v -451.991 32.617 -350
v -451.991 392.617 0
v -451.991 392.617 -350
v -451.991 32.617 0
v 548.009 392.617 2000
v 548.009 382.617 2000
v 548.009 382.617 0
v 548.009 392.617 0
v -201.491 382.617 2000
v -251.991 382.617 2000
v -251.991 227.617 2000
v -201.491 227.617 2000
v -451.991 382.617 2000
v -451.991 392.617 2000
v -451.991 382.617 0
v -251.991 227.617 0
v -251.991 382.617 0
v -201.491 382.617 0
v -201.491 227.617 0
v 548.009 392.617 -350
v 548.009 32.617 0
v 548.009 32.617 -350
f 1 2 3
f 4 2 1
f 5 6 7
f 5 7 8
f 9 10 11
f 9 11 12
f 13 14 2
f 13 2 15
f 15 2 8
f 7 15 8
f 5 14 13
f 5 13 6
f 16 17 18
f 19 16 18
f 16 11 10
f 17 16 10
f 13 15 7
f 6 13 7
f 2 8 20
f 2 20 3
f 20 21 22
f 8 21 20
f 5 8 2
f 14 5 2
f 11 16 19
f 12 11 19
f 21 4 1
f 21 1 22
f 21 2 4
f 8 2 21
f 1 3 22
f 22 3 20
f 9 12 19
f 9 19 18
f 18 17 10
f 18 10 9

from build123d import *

# Parameters (mm, degrees)
F2_DEPTH = 2000
F1_W     = 50.5
F1_H     = 155
F3_DEPTH = 2000
F4_DEPTH = 350


with BuildPart() as f2:
    # F1 (on Top) → F2 (new body)
    with BuildSketch(Plane.XY):
        Polygon((548.0093955994, 392.6169663171), (-451.9906044006, 392.6169663171), (-451.9906044006, 382.6169663171), (-251.9906044006, 382.6169663171), (-201.4906044006, 382.6169663171), (548.0093955994, 382.6169663171), align=None)
    extrude(amount=F2_DEPTH)


with BuildPart() as f3:
    # F1 (on Top) → F3 (new body)
    with BuildSketch(Plane.XY):
        with Locations((-226.7406044006, 305.1169663171)):
            Rectangle(F1_W, F1_H)
    extrude(amount=F3_DEPTH)


with BuildPart() as f4:
    # F1 (on Top) → F4 (new body)
    with BuildSketch(Plane.XY):
        Polygon((-251.9906044006, 382.6169663171), (-451.9906044006, 382.6169663171), (-451.9906044006, 32.6169663171), (548.0093955994, 32.6169663171), (548.0093955994, 382.6169663171), (-201.4906044006, 382.6169663171), (-201.4906044006, 227.6169663171), (-251.9906044006, 227.6169663171), align=None)
        with Locations((-226.7406044006, 305.1169663171)):
            Rectangle(F1_W, F1_H)
        Polygon((548.0093955994, 392.6169663171), (-451.9906044006, 392.6169663171), (-451.9906044006, 382.6169663171), (-251.9906044006, 382.6169663171), (-201.4906044006, 382.6169663171), (548.0093955994, 382.6169663171), align=None)
    extrude(amount=-F4_DEPTH)


solid = Compound([f2.part, f3.part, f4.part])
